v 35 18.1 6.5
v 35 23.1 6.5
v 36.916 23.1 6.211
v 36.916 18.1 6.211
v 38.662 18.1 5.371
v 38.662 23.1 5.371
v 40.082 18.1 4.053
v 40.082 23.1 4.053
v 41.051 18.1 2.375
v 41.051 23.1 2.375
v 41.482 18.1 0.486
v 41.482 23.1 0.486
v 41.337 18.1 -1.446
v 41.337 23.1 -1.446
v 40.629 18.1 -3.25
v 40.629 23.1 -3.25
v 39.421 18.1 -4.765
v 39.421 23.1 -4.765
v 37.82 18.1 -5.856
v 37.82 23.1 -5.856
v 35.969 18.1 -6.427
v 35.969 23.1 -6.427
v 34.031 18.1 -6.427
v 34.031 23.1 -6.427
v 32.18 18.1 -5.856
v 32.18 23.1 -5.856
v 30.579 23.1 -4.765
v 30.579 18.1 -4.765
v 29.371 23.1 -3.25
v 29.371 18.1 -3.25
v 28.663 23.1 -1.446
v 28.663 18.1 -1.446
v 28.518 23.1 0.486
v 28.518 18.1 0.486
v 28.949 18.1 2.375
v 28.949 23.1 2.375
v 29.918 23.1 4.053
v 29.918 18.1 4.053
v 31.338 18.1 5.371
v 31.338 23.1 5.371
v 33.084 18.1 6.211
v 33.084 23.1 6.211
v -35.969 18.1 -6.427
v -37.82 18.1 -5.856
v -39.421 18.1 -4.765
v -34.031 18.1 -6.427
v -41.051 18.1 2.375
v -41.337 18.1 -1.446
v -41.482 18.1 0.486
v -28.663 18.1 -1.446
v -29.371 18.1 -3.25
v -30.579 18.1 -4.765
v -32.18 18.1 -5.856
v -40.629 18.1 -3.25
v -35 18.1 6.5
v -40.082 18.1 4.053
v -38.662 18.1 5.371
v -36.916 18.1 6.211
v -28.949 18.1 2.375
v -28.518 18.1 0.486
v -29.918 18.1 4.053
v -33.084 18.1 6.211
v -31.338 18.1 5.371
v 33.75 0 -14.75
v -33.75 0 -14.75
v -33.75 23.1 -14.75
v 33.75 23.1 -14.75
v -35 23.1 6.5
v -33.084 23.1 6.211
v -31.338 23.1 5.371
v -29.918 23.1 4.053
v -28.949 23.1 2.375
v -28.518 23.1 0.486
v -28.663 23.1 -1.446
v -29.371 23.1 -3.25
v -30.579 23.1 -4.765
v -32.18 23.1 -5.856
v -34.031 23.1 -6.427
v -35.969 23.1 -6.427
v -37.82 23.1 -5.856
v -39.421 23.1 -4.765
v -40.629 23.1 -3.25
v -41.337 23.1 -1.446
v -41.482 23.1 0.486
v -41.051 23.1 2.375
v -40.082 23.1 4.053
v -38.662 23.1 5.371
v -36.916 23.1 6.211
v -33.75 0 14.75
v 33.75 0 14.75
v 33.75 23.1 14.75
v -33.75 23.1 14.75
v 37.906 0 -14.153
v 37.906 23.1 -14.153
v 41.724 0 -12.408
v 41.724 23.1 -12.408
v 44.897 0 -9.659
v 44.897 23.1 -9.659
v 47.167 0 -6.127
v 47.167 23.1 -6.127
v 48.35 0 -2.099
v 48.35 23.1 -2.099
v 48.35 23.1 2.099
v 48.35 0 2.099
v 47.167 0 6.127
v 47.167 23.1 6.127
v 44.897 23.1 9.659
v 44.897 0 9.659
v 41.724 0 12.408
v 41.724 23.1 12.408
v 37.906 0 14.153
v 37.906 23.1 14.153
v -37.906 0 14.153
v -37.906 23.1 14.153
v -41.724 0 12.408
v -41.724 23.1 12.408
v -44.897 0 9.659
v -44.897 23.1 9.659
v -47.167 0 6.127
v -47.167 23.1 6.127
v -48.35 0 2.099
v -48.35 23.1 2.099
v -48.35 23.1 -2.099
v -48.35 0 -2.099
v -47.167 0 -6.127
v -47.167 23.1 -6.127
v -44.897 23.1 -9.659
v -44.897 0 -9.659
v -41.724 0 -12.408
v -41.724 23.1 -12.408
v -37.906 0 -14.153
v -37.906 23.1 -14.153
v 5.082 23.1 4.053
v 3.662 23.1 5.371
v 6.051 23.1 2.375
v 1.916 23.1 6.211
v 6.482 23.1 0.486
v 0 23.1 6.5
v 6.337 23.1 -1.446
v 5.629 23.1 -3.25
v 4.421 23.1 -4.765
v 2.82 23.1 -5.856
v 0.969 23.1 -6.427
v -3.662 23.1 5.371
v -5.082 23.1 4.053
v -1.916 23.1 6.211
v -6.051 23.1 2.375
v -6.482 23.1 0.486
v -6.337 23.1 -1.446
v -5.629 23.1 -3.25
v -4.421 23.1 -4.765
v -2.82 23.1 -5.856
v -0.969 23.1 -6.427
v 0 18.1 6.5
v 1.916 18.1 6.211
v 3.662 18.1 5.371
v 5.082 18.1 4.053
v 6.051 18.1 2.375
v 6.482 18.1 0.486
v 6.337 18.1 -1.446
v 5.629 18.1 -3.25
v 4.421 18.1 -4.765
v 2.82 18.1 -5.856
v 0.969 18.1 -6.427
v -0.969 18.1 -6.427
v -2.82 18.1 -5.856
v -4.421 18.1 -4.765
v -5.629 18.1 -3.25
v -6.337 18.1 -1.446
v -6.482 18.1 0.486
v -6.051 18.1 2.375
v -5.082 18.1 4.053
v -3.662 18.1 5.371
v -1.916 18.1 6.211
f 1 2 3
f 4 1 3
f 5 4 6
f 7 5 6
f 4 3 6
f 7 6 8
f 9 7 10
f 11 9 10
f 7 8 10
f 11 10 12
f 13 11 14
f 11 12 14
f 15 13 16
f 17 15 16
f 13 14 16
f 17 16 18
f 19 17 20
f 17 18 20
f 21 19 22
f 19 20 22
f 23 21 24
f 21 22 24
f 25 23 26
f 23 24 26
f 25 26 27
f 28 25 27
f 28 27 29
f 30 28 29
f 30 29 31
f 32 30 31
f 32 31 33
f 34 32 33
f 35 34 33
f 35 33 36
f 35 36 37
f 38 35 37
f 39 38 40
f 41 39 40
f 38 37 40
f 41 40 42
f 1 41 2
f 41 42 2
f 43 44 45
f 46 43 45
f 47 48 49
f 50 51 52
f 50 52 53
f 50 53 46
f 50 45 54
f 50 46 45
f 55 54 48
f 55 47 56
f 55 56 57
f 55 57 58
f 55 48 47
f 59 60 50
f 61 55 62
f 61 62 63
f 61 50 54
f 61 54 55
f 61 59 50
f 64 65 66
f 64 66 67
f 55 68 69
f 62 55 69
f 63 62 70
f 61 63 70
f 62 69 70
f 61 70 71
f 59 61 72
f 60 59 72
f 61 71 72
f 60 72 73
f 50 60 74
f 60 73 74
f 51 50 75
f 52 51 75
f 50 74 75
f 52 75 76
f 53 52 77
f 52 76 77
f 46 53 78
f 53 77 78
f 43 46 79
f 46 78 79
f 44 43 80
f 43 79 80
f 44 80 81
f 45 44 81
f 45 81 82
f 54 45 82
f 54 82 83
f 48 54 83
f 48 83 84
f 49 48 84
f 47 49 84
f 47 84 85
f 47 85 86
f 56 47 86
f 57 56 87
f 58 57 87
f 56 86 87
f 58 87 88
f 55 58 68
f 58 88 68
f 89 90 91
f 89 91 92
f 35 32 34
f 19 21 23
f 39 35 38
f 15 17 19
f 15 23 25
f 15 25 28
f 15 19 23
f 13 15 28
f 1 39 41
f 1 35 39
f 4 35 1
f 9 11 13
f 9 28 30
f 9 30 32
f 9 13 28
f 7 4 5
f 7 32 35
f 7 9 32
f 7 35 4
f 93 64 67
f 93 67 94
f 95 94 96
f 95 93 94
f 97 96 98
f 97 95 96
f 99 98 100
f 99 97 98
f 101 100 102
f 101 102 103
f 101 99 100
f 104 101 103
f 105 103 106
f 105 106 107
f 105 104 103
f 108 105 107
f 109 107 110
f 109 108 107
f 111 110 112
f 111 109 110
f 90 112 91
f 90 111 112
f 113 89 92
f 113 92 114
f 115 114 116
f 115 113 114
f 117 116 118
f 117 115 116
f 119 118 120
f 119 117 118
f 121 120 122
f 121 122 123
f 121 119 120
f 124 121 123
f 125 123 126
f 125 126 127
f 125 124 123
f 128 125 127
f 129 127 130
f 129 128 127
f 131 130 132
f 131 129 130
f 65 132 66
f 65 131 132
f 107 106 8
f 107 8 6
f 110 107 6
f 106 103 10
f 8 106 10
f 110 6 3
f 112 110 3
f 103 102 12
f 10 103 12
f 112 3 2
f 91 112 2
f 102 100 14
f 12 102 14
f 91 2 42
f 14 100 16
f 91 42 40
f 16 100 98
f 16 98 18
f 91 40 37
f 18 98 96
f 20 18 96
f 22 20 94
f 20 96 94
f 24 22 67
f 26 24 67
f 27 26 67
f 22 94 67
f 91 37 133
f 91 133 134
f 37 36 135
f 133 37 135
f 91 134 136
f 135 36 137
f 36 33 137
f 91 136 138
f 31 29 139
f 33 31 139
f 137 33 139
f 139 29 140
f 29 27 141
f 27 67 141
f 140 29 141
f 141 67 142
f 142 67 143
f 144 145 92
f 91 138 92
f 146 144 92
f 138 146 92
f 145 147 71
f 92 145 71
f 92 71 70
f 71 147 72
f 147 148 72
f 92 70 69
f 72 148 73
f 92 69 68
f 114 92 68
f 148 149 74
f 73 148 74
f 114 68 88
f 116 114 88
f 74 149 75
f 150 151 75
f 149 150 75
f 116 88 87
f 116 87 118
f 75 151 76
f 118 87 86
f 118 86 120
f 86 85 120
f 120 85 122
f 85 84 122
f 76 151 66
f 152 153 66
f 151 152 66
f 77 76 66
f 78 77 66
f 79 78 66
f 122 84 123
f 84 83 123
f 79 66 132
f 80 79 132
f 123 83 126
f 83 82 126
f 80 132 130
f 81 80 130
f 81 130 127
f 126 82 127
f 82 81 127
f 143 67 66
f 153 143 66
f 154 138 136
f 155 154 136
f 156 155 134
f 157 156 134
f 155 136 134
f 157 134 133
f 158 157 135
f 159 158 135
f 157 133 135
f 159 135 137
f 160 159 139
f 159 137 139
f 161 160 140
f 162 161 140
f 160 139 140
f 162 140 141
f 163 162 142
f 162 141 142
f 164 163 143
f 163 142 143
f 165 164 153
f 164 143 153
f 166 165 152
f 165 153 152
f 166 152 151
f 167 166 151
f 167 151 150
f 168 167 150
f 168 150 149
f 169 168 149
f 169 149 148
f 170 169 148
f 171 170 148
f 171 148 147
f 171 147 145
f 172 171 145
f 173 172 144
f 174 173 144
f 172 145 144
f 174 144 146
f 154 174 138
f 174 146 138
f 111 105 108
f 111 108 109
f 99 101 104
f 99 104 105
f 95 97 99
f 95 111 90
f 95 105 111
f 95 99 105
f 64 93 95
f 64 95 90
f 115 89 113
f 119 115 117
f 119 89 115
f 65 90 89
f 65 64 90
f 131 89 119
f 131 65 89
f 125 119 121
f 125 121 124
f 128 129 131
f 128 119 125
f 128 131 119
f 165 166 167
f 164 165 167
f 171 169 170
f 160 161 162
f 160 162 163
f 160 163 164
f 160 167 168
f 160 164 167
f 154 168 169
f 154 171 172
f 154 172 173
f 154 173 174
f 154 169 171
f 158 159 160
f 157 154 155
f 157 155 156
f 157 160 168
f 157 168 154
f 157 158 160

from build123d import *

# Parameters (mm, degrees)
BOSS_EXTRUDE1_DEPTH = 23.1
SKETCH2_R           = 6.5
CUT_EXTRUDE1_DEPTH  = 5


with BuildPart() as part:
    # Sketch1 → Boss-Extrude1 (new body)
    with BuildSketch(Plane(origin=(0, 0, 0), x_dir=(1, 0, 0), z_dir=(0, 1, 0))):
        with BuildLine():
            ThreePointArc((33.75, 14.75), (48.5, 0), (33.75, -14.75))
            Line((33.75, -14.75), (-33.75, -14.75))
            ThreePointArc((-33.75, -14.75), (-48.5, 0), (-33.75, 14.75))
            Line((-33.75, 14.75), (33.75, 14.75))
        make_face()
    extrude(amount=BOSS_EXTRUDE1_DEPTH)

    # Sketch2 → Cut-Extrude1 (cut)
    with BuildSketch(Plane(origin=(0, 23.1, 0), x_dir=(1, 0, 0), z_dir=(0, 1, 0))):
        with Locations(Location((0, 0, 0), (0, 0, 270))):
            Circle(SKETCH2_R)
        with Locations(Location((-35, 0, 0), (0, 0, 270))):
            Circle(SKETCH2_R)
        with Locations(Location((35, 0, 0), (0, 0, 270))):
            Circle(SKETCH2_R)
    extrude(amount=-CUT_EXTRUDE1_DEPTH, mode=Mode.SUBTRACT)


solid = part.part
